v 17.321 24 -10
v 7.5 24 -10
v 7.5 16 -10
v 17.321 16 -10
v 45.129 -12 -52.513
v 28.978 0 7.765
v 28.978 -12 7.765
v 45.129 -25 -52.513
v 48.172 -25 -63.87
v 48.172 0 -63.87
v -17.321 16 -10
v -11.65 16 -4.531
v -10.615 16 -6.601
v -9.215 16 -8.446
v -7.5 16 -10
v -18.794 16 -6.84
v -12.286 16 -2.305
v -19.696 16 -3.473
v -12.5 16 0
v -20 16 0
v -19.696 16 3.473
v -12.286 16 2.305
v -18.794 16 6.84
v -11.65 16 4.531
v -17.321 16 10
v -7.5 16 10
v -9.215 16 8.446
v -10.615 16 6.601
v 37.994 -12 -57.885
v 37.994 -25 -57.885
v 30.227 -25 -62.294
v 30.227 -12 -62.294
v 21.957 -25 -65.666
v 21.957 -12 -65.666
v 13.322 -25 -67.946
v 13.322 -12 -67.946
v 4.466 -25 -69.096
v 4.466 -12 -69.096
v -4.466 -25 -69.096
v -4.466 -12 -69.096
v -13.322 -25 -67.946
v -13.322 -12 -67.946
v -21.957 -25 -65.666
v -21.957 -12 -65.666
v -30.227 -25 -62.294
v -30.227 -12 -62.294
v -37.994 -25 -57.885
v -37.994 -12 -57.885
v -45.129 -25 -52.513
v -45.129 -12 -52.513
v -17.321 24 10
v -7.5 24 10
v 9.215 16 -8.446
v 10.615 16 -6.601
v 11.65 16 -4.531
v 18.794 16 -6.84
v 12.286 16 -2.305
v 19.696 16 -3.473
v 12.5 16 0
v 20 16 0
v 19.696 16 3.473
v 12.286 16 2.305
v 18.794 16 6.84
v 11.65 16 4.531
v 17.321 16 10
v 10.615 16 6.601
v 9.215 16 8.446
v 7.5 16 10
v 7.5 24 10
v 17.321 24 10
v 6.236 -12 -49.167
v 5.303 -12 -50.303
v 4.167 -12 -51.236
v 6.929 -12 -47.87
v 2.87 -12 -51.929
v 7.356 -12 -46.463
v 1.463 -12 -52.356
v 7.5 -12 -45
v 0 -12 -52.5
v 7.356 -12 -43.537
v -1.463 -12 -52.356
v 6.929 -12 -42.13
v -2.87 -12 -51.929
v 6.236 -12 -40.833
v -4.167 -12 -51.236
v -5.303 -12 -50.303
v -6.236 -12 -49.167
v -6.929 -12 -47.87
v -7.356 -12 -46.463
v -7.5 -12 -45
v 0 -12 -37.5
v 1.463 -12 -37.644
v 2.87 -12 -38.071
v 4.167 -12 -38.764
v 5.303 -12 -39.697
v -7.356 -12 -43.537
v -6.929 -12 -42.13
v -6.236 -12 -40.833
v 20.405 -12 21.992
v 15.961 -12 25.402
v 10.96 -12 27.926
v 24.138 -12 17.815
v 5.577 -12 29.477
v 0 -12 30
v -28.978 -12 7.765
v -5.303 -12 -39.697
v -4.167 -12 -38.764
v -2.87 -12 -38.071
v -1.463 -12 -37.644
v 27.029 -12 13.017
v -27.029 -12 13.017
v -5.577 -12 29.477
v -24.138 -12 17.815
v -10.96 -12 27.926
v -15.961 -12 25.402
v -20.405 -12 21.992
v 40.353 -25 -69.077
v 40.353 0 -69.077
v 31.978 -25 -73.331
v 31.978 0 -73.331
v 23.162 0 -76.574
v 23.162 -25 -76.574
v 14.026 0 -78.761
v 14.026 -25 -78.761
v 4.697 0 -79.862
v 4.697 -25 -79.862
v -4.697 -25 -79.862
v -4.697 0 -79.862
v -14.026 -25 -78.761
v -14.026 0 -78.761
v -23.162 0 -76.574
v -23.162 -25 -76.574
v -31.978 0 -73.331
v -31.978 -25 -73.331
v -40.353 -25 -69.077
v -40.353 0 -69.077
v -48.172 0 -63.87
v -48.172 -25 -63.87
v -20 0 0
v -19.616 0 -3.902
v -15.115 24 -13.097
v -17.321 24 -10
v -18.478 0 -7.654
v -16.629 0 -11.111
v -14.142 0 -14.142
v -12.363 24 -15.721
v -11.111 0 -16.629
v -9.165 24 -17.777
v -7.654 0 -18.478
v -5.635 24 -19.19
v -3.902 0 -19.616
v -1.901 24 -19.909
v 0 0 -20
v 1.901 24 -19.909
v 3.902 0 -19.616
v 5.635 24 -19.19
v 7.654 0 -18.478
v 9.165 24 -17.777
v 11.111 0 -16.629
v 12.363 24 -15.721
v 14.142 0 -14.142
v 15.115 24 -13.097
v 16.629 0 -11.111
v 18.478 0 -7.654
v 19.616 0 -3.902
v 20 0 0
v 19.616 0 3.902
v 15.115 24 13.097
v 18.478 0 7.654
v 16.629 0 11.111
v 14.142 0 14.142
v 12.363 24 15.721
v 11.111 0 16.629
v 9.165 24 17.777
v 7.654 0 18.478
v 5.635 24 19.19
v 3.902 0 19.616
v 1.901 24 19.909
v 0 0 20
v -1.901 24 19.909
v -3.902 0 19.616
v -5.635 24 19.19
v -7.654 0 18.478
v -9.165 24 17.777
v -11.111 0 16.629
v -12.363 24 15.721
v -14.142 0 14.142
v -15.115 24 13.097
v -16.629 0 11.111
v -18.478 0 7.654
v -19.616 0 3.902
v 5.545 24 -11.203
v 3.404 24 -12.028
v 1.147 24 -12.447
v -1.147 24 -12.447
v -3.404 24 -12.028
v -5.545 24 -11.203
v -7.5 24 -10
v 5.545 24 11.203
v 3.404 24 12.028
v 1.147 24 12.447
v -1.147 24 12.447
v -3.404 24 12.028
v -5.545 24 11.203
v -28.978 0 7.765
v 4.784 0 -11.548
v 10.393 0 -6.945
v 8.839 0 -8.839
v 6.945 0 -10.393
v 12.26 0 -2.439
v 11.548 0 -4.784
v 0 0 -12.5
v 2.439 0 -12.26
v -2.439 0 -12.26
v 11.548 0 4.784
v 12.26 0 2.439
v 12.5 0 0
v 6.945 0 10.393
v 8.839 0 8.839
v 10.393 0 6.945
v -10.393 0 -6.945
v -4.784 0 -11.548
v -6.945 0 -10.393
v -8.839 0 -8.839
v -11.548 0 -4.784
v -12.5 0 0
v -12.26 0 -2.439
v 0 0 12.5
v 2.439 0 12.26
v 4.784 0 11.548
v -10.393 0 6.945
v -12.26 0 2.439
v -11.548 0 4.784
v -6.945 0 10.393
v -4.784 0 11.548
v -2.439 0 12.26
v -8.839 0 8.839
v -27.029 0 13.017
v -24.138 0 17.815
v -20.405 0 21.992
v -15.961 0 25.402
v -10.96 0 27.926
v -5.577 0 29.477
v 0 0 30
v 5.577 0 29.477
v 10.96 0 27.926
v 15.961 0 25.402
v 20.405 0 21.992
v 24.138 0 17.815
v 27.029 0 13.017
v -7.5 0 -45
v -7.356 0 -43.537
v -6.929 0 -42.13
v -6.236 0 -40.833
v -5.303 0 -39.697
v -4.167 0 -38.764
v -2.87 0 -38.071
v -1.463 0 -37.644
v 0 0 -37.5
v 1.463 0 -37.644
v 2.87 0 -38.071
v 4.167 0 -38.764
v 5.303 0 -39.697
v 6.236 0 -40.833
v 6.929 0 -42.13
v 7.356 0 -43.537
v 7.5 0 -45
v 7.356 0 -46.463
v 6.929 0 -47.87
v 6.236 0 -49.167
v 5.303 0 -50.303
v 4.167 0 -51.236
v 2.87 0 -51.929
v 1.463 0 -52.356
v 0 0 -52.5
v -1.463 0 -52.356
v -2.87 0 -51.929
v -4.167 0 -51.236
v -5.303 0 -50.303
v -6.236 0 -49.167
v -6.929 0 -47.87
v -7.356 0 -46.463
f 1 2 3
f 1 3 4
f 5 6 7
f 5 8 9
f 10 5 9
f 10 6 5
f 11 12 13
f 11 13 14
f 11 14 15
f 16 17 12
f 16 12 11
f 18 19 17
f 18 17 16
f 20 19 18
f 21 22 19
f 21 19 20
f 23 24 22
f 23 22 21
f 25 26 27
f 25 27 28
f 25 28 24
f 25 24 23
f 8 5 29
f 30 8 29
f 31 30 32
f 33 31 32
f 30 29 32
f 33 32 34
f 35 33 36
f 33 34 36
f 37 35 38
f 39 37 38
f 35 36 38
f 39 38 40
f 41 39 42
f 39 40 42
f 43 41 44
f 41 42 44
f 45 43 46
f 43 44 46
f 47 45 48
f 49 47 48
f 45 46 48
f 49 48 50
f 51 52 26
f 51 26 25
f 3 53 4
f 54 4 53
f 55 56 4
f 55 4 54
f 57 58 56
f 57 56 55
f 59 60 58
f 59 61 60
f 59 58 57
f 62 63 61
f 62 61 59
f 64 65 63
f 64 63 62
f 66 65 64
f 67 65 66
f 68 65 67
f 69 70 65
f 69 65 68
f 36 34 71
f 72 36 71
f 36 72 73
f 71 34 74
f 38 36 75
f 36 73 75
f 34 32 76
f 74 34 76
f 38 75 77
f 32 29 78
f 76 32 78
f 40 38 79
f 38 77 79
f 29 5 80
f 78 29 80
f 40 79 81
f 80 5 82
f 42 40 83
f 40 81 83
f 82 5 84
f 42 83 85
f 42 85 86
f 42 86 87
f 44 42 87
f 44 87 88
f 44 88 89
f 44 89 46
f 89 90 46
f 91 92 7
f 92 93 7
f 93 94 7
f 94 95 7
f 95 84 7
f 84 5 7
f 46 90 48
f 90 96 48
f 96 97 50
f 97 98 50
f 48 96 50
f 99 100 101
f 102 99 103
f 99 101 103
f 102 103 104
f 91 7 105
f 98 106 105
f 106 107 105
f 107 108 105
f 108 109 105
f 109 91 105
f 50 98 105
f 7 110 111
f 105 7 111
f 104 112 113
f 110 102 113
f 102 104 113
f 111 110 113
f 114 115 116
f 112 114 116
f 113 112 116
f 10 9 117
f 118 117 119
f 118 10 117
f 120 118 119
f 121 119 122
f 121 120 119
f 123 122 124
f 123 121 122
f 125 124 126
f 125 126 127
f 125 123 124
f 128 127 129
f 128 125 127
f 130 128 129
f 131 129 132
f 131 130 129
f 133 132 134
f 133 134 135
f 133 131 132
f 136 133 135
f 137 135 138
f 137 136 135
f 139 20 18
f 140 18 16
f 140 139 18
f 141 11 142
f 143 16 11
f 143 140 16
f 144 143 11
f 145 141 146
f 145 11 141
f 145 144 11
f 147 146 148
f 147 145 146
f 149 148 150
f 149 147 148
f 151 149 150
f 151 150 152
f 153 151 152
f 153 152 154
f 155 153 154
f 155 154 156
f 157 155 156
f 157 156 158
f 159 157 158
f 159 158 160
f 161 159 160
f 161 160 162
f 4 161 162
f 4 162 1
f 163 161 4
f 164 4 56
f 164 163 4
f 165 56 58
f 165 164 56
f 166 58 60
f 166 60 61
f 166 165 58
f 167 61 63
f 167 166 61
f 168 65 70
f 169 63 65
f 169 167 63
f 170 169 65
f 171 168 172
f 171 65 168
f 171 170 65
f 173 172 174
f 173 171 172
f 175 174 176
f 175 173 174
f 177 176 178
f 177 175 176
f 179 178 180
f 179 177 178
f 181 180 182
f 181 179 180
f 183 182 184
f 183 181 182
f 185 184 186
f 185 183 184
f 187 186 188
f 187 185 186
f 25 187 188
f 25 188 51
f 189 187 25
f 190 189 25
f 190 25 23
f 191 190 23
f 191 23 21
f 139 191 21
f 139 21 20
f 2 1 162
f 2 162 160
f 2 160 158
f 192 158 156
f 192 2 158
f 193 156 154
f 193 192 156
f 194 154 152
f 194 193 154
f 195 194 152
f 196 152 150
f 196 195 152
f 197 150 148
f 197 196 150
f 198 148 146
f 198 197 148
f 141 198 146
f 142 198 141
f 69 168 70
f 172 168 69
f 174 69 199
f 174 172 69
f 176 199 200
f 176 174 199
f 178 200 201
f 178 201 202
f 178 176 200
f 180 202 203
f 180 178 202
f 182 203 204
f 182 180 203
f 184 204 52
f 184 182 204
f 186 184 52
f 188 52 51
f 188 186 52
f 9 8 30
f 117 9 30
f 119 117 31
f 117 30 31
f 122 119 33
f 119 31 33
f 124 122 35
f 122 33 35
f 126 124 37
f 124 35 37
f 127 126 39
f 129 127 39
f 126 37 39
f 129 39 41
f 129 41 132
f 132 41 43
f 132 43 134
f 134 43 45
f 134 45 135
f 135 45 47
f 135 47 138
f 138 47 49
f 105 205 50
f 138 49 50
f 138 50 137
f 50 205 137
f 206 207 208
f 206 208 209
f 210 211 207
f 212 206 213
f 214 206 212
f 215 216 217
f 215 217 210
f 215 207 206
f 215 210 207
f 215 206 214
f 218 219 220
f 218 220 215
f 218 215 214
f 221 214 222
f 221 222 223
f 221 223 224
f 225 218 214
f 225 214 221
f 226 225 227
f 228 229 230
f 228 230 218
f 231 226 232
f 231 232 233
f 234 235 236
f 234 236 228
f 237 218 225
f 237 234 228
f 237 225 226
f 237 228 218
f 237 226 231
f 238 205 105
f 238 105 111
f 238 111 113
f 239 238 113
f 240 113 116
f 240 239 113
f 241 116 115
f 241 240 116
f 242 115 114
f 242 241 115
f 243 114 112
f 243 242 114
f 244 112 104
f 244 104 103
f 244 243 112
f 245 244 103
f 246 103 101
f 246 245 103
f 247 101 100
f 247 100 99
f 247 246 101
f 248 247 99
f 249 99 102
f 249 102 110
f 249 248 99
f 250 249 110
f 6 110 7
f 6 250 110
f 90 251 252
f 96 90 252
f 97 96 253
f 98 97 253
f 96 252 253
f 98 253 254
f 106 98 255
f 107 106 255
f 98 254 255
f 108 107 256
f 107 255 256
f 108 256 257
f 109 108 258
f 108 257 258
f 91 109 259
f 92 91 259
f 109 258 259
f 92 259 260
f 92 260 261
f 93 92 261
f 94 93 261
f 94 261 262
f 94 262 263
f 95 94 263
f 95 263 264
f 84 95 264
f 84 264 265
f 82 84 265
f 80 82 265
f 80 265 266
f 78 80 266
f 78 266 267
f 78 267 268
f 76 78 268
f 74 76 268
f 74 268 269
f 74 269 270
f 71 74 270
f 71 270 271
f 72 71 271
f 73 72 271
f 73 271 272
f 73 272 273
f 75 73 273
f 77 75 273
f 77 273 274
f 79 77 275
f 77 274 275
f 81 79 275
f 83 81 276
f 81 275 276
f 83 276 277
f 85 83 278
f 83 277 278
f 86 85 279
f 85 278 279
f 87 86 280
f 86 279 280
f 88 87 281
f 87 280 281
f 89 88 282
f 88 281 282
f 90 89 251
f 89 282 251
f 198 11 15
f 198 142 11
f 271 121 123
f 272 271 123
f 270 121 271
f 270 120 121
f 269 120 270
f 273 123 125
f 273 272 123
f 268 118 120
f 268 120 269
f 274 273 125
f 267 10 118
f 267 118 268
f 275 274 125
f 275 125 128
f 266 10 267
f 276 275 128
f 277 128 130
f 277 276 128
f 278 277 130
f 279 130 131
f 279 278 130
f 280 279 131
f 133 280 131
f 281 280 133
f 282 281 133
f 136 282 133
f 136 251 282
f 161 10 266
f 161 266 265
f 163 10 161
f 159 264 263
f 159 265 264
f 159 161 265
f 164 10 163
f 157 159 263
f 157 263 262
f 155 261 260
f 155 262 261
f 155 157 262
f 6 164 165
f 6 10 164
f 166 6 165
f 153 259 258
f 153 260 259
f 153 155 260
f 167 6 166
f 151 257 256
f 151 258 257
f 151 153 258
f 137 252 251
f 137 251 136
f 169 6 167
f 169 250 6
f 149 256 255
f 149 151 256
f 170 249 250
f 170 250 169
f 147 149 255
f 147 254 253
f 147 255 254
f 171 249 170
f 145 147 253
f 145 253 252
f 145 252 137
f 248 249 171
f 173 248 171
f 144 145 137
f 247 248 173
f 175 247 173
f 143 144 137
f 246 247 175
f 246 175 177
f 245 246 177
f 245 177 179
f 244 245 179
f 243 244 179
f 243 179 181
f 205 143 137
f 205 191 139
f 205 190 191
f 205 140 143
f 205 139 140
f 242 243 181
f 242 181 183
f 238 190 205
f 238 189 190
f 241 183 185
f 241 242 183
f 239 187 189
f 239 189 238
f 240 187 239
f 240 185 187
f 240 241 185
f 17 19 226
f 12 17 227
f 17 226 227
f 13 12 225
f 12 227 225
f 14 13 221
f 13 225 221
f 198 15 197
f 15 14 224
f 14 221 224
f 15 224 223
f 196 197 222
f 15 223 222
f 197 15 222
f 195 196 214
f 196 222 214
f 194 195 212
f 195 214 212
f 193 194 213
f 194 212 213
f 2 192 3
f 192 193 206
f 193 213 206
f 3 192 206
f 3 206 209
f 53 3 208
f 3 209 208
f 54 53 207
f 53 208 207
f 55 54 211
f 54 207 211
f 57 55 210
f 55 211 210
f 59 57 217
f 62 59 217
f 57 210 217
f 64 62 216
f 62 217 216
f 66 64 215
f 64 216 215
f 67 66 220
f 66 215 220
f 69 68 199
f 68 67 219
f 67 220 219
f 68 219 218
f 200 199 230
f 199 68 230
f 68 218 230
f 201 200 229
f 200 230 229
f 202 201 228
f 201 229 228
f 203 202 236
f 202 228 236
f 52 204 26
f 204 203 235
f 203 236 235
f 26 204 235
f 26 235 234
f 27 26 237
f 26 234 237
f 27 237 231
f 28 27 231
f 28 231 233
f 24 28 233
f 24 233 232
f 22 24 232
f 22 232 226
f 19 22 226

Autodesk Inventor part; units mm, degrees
ref_plane "YZ Plane" through (0, 0, 0) normal (1, 0, 0) x (0, 1, 0)
ref_plane "XZ Plane" through (0, 0, 0) normal (0, 1, 0) x (-1, 0, 0)
ref_plane "XY Plane" through (0, 0, 0) normal (0, 0, 1) x (1, 0, 0)
sketch "Sketch1" plane through (0, 0, 0) normal (0, 1, 0) x (-1, 0, 0)
  circle A0 centre (0, 0) radius 30
  circle A1 centre (0, 0) radius 20
  circle A2 centre (0, 0) radius 12.5
  line L0 (0, 0) -> (0, -45) construction
  circle A3 centre (0, -45) radius 7.5
  line L1 (-21, 10) -> (21, 10)
  line L2 (21, 10) -> (21, -10)
  line L3 (21, -10) -> (-21, -10)
  line L4 (-21, -10) -> (-21, 10)
  line L5 (-21, 10) -> (21, -10) construction
  line L6 (21, 10) -> (-21, -10) construction
  line L7 (28.9778, 7.7646) -> (48.1723, -63.8704)
  line L8 (-28.9778, 7.7646) -> (-48.1723, -63.8704)
  arc A4 (-48.1723, -63.8704) -> (48.1723, -63.8704) centre (0, 0) ccw
  arc A5 (-45.129, -52.5126) -> (45.129, -52.5126) centre (0, 0) ccw
  dimension "d0" = 60
  dimension "d1" = 40
  dimension "d2" = 25
  dimension "d5" = 45
  dimension "d6" = 15
  dimension "d7" = 42
  dimension "d8" = 20
  dimension "d11" = 80
  dimension "d12" = 30
  dimension "d13" = 15
  dimension "d19" = 69.2401
extrude "Extrusion1" add sketch "Sketch1" along normal blind 24 contours A1 L3 A2 L1 | L1 A2 A1 | A1 L3 A2 | L1 A2 L3 A1
extrude "Extrusion2" cut sketch "Sketch1" against normal blind 8 from surface at 24 contours A0 | A1 L3 A2 L1 | A1 L1 L2 L3 | L1 A2 L3 A1 | A1 L3 L4 L1 | A2 L3 L1
extrude "Extrusion3" add sketch "Sketch1" against normal blind 25 contours L7 A4 L8 A5
extrude "Extrusion4" add sketch "Sketch1" against normal blind 12 contours A0 | A0 L7 A5 L8 | A1 L3 A2 L1 | A1 L1 L2 L3 | L1 A2 A1 | A1 L3 A2 | L1 A2 L3 A1 | A1 L3 L4 L1 | L1 A2 | A2 L3 L1 | A2 L3
properties part number "C"
